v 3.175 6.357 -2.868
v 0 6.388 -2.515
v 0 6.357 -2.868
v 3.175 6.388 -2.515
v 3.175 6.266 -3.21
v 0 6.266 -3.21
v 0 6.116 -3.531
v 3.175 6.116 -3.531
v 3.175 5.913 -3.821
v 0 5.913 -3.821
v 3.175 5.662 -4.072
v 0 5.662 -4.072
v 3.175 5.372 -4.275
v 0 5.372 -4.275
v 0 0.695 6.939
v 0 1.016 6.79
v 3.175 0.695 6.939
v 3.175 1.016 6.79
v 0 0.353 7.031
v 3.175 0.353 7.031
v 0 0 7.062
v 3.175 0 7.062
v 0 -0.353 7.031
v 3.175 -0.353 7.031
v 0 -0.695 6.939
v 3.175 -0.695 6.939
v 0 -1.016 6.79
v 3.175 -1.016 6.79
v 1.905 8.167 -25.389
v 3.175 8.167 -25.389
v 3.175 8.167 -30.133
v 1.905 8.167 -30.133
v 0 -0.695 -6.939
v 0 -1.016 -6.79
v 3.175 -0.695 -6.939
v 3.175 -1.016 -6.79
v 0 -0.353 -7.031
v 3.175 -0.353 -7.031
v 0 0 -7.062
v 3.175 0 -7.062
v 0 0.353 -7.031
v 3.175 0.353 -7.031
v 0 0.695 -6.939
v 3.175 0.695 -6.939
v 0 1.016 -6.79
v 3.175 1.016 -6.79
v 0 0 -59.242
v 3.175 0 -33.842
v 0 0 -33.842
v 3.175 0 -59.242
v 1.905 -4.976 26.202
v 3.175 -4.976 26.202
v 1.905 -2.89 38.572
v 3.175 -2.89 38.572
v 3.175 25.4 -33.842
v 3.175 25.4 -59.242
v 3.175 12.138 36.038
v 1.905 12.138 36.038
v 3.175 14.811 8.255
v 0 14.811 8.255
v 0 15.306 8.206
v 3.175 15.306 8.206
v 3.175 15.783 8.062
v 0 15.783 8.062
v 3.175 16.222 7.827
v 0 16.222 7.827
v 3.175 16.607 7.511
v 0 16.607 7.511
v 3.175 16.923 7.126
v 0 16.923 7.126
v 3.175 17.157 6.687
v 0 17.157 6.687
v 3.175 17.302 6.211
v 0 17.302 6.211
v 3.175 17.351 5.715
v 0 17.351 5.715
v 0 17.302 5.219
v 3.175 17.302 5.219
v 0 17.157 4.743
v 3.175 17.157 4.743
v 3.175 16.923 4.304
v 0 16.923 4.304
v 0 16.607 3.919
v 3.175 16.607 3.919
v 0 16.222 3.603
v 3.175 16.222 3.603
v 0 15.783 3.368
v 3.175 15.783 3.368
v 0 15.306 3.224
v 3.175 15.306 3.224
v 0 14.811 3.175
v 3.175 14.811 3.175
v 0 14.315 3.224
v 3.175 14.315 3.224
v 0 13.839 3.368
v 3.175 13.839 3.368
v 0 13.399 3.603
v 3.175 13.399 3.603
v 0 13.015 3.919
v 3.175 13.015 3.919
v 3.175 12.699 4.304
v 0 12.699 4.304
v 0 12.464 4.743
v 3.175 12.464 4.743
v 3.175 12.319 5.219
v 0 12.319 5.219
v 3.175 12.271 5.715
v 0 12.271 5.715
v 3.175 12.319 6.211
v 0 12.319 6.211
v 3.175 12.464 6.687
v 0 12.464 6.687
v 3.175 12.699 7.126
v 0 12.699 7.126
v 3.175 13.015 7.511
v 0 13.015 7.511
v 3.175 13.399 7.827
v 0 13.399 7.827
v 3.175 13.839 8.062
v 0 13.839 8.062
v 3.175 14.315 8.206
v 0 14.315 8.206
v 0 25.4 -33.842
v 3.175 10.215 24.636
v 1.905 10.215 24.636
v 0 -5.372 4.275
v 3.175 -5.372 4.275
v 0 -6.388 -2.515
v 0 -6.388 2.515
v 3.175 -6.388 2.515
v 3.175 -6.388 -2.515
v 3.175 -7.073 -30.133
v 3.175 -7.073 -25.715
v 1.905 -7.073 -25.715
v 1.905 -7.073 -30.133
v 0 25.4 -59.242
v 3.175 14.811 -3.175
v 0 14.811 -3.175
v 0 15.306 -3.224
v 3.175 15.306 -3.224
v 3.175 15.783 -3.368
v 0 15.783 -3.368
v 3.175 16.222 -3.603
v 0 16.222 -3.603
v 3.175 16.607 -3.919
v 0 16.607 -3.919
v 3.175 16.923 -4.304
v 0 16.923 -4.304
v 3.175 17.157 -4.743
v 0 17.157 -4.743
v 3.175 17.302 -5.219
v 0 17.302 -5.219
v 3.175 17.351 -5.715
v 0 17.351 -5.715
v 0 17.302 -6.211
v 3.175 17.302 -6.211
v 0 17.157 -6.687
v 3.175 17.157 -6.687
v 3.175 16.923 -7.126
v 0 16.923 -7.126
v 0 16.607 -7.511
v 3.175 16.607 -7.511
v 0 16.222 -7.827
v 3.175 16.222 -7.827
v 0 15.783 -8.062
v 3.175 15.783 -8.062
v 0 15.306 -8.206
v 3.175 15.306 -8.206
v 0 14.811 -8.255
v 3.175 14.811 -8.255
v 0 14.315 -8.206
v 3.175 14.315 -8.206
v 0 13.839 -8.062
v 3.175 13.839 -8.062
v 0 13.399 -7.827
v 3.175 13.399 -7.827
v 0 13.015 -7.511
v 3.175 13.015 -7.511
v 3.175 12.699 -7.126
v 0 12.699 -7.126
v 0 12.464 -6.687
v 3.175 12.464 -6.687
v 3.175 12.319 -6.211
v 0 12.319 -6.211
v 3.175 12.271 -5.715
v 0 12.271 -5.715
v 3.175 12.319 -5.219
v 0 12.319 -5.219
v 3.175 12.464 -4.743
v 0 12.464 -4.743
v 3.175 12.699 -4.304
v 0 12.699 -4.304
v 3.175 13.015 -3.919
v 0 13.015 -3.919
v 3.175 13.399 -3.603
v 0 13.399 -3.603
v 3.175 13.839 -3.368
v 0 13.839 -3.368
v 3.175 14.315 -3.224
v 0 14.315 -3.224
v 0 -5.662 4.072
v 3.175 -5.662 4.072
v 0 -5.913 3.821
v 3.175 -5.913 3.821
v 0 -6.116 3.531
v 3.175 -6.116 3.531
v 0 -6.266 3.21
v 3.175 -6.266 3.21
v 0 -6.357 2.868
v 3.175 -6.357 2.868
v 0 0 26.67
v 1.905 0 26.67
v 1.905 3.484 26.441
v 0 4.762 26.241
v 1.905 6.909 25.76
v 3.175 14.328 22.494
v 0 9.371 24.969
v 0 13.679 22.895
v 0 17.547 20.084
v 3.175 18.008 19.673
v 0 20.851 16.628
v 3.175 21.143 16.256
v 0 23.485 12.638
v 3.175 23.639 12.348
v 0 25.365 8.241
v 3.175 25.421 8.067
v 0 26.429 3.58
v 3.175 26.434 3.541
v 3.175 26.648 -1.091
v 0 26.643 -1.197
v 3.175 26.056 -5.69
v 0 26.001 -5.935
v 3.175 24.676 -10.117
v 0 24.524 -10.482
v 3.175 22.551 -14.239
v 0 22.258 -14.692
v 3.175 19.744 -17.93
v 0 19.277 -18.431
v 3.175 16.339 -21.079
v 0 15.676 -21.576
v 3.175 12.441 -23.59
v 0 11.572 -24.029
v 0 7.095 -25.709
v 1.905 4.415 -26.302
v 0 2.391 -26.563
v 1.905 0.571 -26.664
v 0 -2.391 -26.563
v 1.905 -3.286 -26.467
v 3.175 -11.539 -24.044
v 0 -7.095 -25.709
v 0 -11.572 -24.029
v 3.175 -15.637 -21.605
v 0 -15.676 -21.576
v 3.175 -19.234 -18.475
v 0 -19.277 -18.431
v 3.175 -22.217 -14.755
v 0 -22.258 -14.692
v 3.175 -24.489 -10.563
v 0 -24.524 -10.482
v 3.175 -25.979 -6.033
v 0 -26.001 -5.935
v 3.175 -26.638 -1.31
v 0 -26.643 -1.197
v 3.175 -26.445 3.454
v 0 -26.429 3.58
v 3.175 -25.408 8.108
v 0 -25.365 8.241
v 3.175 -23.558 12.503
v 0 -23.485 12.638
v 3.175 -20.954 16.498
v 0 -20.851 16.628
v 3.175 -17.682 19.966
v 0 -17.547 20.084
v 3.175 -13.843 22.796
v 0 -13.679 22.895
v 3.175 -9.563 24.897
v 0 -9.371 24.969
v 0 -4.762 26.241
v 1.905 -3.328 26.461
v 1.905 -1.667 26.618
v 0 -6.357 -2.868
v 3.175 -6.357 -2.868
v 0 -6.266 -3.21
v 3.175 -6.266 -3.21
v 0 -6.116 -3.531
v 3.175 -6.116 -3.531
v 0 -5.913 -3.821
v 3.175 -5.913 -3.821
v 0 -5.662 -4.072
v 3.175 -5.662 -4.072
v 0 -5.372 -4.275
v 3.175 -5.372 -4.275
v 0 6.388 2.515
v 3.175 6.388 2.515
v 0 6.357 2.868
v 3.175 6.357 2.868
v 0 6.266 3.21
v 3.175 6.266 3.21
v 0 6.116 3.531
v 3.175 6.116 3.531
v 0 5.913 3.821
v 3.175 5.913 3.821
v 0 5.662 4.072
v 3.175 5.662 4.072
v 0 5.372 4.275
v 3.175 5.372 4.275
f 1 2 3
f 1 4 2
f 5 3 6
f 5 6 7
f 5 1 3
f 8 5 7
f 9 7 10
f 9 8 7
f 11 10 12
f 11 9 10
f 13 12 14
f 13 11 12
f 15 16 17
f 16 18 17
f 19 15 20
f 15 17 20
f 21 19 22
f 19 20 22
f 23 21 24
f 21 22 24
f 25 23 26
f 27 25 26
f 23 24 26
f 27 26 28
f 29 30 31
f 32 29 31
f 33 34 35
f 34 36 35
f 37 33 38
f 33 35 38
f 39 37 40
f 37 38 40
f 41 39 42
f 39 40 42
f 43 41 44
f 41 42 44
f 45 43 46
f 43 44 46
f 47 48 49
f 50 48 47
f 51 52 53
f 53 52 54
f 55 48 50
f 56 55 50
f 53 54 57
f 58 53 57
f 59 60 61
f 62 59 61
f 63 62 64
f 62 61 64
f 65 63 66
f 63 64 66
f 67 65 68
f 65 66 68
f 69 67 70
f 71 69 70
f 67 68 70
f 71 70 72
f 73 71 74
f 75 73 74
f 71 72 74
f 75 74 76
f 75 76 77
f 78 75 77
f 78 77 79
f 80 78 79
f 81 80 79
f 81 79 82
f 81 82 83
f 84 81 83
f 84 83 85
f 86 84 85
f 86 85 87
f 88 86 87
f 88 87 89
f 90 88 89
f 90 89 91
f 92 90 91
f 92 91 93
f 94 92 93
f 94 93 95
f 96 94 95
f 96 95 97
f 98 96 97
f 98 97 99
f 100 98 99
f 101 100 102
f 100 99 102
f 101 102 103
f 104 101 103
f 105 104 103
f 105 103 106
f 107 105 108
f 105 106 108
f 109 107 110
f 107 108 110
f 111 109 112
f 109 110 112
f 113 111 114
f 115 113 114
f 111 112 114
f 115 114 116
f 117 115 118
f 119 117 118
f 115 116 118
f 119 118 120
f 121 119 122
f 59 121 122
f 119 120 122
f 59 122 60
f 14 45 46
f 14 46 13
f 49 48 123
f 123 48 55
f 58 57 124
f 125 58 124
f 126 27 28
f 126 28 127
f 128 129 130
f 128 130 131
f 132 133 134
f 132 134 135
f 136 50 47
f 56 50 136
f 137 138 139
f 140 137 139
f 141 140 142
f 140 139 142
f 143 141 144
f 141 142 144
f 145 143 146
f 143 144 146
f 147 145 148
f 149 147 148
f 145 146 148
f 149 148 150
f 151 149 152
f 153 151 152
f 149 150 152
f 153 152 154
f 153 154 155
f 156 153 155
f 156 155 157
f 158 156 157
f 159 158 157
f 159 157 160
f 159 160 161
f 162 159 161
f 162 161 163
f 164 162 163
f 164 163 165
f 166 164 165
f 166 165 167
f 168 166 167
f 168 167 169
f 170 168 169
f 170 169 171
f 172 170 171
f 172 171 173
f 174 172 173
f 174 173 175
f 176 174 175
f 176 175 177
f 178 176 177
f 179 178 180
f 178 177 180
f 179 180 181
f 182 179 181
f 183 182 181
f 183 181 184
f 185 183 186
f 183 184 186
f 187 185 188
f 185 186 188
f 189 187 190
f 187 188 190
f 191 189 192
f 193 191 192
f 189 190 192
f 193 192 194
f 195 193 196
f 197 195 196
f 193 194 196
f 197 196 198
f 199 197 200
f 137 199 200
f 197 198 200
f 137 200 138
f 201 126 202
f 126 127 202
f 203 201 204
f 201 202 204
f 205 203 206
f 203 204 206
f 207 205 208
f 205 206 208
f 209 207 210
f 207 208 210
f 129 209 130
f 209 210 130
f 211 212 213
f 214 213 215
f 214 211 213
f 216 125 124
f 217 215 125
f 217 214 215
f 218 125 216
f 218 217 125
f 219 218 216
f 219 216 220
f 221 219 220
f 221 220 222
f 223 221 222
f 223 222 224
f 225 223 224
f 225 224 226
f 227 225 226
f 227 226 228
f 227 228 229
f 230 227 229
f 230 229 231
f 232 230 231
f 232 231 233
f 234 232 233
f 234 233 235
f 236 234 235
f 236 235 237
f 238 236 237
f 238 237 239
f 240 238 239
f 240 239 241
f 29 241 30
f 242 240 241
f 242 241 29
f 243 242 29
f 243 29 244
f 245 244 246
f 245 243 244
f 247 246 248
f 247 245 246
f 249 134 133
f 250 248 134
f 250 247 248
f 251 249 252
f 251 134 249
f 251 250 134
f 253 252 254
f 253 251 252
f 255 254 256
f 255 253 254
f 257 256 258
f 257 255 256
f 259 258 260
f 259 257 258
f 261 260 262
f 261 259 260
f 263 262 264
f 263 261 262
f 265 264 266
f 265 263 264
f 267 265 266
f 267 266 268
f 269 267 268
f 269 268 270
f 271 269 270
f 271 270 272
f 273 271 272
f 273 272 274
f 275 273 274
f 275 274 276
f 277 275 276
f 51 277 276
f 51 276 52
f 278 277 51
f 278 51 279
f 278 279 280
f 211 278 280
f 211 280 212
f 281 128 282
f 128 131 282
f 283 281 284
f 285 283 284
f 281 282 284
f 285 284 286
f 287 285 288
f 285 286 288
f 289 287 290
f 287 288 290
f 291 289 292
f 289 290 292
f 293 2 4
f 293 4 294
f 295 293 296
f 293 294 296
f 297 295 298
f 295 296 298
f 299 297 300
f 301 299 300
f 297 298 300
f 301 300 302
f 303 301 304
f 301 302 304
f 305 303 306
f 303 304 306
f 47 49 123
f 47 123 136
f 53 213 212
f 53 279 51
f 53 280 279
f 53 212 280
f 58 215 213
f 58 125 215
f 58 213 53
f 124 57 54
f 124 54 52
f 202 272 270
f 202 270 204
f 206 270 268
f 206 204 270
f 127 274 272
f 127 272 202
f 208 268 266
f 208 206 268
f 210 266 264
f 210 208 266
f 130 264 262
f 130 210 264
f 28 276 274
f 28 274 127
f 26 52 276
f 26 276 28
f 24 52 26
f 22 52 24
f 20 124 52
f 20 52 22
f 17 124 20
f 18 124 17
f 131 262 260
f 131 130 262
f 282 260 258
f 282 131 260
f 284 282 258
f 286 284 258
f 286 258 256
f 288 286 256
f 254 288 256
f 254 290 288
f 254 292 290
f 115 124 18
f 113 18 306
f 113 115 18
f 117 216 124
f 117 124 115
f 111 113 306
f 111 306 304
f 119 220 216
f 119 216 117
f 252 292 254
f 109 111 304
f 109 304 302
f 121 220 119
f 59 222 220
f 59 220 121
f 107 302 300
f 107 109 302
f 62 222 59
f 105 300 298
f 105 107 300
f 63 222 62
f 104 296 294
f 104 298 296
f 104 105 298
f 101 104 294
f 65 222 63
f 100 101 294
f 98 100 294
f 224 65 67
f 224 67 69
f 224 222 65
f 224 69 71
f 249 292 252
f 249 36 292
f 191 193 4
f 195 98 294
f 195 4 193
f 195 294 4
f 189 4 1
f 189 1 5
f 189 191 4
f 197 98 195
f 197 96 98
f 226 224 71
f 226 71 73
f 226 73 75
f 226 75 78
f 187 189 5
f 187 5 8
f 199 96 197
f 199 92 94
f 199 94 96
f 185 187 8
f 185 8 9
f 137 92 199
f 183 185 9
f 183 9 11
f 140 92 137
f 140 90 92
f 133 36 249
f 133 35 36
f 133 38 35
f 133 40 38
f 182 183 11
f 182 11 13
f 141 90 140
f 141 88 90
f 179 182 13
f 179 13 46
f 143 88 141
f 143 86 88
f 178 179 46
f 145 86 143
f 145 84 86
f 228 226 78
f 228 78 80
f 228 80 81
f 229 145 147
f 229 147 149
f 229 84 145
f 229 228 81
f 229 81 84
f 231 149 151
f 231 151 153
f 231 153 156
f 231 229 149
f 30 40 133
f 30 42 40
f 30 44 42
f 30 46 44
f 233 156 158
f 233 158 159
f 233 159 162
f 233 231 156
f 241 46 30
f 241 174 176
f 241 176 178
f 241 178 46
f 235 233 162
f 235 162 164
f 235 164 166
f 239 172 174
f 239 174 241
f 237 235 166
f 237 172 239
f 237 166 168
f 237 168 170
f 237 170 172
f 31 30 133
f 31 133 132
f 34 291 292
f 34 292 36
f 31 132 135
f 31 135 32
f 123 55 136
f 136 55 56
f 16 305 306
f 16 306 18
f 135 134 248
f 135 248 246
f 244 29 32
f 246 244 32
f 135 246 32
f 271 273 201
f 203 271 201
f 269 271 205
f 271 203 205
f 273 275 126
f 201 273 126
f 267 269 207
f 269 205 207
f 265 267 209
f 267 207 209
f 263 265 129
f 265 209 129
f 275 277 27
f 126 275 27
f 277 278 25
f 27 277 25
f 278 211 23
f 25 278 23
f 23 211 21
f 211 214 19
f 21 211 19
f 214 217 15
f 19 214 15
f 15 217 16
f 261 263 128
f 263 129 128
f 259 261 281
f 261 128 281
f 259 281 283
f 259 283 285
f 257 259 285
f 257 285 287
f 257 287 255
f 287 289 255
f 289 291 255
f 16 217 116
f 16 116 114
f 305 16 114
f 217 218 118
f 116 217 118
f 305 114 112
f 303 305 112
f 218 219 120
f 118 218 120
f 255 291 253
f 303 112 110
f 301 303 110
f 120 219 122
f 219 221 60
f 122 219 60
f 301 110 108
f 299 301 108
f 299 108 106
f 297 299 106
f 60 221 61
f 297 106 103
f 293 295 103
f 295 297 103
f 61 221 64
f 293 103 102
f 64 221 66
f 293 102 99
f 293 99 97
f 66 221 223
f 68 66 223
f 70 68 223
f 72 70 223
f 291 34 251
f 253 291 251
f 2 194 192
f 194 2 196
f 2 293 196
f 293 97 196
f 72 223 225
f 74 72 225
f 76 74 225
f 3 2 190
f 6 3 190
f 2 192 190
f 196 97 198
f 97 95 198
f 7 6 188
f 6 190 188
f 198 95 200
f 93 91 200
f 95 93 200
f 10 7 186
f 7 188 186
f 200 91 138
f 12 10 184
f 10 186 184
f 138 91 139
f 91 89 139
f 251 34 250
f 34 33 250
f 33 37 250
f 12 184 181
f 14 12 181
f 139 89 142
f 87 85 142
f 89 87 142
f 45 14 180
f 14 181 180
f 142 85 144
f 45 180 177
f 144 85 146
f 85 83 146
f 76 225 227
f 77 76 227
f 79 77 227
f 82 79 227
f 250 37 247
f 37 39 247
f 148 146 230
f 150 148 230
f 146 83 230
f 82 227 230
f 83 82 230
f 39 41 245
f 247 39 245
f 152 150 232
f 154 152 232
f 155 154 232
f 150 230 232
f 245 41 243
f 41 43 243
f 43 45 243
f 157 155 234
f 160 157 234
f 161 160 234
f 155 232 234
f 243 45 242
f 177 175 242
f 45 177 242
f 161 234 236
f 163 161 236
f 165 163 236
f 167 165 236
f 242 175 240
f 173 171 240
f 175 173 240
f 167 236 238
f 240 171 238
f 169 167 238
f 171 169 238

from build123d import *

# Parameters (mm, degrees)
SKETCH1_R           = 29.21
BOSS_EXTRUDE1_DEPTH = 3.175
FILLET1_R           = 2.032
SKETCH3_R           = 2.54
CUT_EXTRUDE2_DEPTH  = 42.431012841
SKETCH4_OUTSIDE_W   = 76.956
SKETCH4_OUTSIDE_H   = 76.956
SKETCH4_OUTSIDE_R   = 26.67
CUT_EXTRUDE3_DEPTH  = 42.431012841
SKETCH7_W           = 25.4
SKETCH7_H           = 25.4
BOSS_EXTRUDE4_DEPTH = 3.175
SKETCH8_W           = 10.832195086
SKETCH8_H           = 15.24
BOSS_EXTRUDE5_DEPTH = 1.27


with BuildPart() as part:
    # Sketch1 → Boss-Extrude1 (new body)
    with BuildSketch(Plane(origin=(0, 0, 0), x_dir=(0, 0, -1), z_dir=(1, 0, 0))):
        Circle(SKETCH1_R)
        Polygon((3.688171255, 6.3881), (-3.688171255, 6.3881), (-7.376342509, 0), (-3.688171255, -6.3881), (3.688171255, -6.3881), (7.376342509, 0), align=None, mode=Mode.SUBTRACT)
    extrude(amount=BOSS_EXTRUDE1_DEPTH)

    # Fillet1
    fillet1_edges = [part.edges().sort_by_distance(p)[0] for p in [
        (1.5875, 6.3881, -3.688171255),
        (1.5875, 6.3881, 3.688171255),
        (1.5875, 0, 7.376342509),
        (1.5875, -6.3881, 3.688171255),
        (1.5875, -6.3881, -3.688171255),
        (1.5875, 0, -7.376342509),
    ]]
    fillet(fillet1_edges, radius=FILLET1_R)

    # Sketch3 → Cut-Extrude2 (cut, through all)
    with BuildSketch(Plane.ZY):
        with Locations((-5.715, 14.810617813)):
            Circle(SKETCH3_R)
        with Locations((5.715, 14.810617813)):
            Circle(SKETCH3_R)
    extrude(amount=-CUT_EXTRUDE2_DEPTH, mode=Mode.SUBTRACT)

    # Sketch4 outside → Cut-Extrude3 (cut, through all)
    with BuildSketch(Plane.ZY):
        Rectangle(SKETCH4_OUTSIDE_W, SKETCH4_OUTSIDE_H)
        Circle(SKETCH4_OUTSIDE_R, mode=Mode.SUBTRACT)
    extrude(amount=-CUT_EXTRUDE3_DEPTH, mode=Mode.SUBTRACT)

    # Sketch8 → Boss-Extrude5 (add)
    with BuildSketch(Plane(origin=(3.175, 0, 0), x_dir=(0, 0, -1), z_dir=(1, 0, 0))):
        Polygon((-20.18704616, 9.464667213), (-22.721085056, -5.56318183), (-38.572167693, -2.890326931), (-36.038128797, 12.137522113), align=None)
        with Locations((24.717087195, 0.546996213)):
            Rectangle(SKETCH8_W, SKETCH8_H)
    extrude(amount=-BOSS_EXTRUDE5_DEPTH)


with BuildPart() as body_2:
    # Sketch7 → Boss-Extrude4 (new body)
    with BuildSketch(Plane(origin=(3.175, 0, 0), x_dir=(0, 0, -1), z_dir=(1, 0, 0))):
        with Locations((46.542333639, 12.7)):
            Rectangle(SKETCH7_W, SKETCH7_H)
    extrude(amount=-BOSS_EXTRUDE4_DEPTH)


solid = Compound([part.part, body_2.part])
